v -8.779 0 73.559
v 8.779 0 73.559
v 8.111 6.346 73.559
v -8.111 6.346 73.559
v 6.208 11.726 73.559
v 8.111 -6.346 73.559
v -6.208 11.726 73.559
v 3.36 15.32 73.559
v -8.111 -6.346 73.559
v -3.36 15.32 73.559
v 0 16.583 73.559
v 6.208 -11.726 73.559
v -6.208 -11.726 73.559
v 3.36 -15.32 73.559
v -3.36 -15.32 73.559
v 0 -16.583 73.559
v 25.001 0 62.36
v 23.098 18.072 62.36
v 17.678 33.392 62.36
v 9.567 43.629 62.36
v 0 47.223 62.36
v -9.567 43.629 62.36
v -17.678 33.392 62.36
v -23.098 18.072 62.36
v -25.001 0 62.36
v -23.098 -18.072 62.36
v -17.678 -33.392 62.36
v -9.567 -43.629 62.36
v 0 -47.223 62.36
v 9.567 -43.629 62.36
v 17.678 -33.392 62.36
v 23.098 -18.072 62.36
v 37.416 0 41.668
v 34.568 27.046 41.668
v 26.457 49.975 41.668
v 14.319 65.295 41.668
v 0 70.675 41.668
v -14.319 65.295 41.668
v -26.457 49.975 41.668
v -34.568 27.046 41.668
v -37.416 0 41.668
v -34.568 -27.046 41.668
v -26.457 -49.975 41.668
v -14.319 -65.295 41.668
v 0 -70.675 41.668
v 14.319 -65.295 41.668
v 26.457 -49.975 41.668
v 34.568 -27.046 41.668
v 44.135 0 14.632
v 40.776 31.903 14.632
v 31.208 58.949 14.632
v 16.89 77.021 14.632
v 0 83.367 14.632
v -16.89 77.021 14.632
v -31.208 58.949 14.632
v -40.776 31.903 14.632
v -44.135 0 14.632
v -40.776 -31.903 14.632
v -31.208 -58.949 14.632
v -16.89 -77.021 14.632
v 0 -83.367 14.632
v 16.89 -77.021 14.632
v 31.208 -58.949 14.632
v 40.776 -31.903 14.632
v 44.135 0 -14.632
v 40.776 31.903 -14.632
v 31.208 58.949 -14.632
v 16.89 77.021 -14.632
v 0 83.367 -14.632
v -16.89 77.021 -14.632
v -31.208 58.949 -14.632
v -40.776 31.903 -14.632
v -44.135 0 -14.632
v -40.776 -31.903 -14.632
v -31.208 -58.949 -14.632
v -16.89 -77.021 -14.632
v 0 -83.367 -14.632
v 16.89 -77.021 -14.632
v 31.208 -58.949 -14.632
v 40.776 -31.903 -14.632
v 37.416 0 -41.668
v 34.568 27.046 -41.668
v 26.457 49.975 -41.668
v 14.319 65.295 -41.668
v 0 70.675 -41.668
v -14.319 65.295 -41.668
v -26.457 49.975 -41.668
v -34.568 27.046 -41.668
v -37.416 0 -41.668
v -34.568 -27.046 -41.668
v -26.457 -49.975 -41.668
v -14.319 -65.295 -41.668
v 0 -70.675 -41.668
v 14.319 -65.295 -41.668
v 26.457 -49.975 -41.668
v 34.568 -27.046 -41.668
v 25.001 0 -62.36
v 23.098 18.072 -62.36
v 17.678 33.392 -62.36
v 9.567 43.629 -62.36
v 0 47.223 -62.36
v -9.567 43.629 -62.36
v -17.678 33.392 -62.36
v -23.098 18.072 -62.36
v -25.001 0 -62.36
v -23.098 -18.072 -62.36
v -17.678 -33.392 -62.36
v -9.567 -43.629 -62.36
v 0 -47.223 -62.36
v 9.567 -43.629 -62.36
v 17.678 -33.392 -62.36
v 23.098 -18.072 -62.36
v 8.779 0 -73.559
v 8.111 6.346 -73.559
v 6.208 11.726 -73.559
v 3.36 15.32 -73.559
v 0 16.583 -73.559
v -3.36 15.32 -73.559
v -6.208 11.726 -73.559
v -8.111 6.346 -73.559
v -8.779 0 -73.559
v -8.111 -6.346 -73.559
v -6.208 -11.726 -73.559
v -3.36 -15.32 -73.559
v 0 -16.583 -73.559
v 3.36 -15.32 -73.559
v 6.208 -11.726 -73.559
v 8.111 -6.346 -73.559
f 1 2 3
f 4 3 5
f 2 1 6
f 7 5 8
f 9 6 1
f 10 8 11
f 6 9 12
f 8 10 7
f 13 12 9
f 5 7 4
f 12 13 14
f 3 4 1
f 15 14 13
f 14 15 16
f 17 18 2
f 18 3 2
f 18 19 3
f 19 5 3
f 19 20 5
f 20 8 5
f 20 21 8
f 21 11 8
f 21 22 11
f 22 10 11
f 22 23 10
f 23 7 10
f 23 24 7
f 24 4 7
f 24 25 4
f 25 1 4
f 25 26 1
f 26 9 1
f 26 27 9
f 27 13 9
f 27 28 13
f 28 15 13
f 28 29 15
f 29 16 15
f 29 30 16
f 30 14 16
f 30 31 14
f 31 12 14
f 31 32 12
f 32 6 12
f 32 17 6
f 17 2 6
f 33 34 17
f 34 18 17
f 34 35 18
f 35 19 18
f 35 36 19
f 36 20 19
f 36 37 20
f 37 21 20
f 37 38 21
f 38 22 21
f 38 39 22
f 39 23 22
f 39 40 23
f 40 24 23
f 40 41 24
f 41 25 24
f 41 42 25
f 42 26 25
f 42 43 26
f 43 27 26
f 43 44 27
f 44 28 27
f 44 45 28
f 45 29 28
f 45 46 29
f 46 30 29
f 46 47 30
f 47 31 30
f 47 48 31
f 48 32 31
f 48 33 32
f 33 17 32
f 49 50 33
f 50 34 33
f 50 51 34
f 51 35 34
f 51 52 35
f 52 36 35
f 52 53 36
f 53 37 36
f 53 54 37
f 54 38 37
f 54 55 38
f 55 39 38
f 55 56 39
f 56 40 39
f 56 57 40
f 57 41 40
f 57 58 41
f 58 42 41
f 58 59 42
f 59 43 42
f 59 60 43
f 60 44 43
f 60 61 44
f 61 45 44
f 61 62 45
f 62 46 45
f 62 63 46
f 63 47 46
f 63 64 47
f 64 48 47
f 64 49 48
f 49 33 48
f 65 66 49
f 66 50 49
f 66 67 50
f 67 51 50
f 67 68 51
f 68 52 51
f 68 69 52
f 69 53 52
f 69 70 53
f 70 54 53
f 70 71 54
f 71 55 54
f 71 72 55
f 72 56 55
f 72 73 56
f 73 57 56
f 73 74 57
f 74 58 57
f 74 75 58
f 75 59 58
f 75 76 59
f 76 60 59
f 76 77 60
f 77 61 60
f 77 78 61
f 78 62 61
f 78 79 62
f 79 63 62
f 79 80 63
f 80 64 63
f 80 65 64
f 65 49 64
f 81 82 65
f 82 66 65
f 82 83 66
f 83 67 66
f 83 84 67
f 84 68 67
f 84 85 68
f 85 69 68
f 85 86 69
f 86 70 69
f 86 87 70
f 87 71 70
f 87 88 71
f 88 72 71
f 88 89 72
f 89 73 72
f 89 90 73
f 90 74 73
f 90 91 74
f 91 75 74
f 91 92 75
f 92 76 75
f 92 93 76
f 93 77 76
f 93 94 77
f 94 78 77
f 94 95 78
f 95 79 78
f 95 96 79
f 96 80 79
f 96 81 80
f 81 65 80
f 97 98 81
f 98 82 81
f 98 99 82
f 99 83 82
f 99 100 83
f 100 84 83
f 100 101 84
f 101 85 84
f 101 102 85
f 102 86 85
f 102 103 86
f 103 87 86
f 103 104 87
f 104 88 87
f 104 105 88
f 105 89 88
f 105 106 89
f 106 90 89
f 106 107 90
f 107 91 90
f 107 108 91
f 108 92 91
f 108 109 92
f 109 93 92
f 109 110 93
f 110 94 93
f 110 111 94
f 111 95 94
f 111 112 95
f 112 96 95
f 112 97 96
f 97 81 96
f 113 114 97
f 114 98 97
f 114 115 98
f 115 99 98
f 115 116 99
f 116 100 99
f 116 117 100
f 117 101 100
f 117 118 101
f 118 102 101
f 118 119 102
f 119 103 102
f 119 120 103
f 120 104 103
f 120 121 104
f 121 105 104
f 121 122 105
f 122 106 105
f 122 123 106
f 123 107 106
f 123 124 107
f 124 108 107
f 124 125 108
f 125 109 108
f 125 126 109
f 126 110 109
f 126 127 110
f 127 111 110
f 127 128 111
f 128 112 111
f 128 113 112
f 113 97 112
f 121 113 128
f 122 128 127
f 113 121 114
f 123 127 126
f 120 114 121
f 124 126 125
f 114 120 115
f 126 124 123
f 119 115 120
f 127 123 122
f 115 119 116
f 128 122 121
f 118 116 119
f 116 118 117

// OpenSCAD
// Generated by SolidPython 1.0.1 on 2020-07-29 00:46:49


scale(v = [9, 17, 15]) {
	sphere(r = 5);
}
/***********************************************
*********      SolidPython code:      **********
************************************************
 
# import packages: SolidPython
from solid import *
from solid.utils import *
from itertools import chain, combinations, permutations


class Resize:

    def __init__(self, scad_file):
        self.scad_file = scad_file
        #self.scad_file = import_scad(scad_file)
        # cone/cylinder param:
        self.r1 = 0
        self.r2 = 0
        self.h = 0
        # rectangular prism param:
        self.w = 0
        self.l = 0
        # ellipse param:
        self.r = 0

    # import OpenScad code (file name corresponds to shape)


    # classify shape + parameters
    def assign(self, param1, param2, param3):
        if self.scad_file == 'cone.scad':
            self.r1 = param1
            self.r2 = param2
            self.h = param3
        elif self.scad_file == 'cylinder.scad':
            self.r1 = param1
            self.r2 = param2
            self.h = param3
        elif self.scad_file == 'rectangularPrism.scad':
            self.h = param1
            self.l = param2
            self.w = param3
        else:
            self.r = param1
            self.h = param2

    # resize parameters
    def iterate(self):
        x = range(3, 20, 2)
        i = 1
        if self.scad_file == 'cone.scad':
            tempList = list(permutations(x, 2))
            for temp in tempList:
                param1 = temp[0]
                param2 = temp[1]
                filepath = 'produced_scad_files/' + 'cone' + str(param1) + '_' + str(param2) + '_' + '.scad'
                scad_render_to_file(cylinder(h=param1, r1=param2, r2=0), filepath)

        elif self.scad_file == 'cylinder.scad':
            tempList = list(permutations(x, 3))
            for temp in tempList:
                param1 = temp[0]
                param2 = temp[1]
                filepath = 'produced_scad_files/' + 'cylinder' + str(param1) + '_' + str(param2) + '_' + '.scad'
                scad_render_to_file(cylinder(h=param1, r1=param2, r2=param2), filepath)

        elif self.scad_file == 'rectangularPrism.scad':
            tempList = list(permutations(x, 3))
            for temp in tempList:
                param1 = temp[0]
                param2 = temp[1]
                param3 = temp[2]
                filepath = 'produced_scad_files/' + 'rectangularPrism' + str(param1) + '_' + str(param2) + '_' + str(
                    param3) + '.scad'
                scad_render_to_file(cube(size=(param1, param2, param3)), filepath)

        elif self.scad_file == 'ellipse.scad':
            tempList = list(permutations(x, 4))
            for temp in tempList:
                param1 = temp[0]
                param2 = temp[1]
                param3 = temp[2]
                param4 = temp[3]
                filepath = 'produced_scad_files/' + 'ellipse' + str(param1) + '_' + str(param2) + '_' + str(param3) + '_' + str(param4) + '.scad'
                scad_render_to_file(scale([param1, param2, param3])(sphere(r=param4)), filepath)

    def render_to_scadfile(self):
        scad_render_to_file(scad, 'example.scad') 
 
************************************************/
